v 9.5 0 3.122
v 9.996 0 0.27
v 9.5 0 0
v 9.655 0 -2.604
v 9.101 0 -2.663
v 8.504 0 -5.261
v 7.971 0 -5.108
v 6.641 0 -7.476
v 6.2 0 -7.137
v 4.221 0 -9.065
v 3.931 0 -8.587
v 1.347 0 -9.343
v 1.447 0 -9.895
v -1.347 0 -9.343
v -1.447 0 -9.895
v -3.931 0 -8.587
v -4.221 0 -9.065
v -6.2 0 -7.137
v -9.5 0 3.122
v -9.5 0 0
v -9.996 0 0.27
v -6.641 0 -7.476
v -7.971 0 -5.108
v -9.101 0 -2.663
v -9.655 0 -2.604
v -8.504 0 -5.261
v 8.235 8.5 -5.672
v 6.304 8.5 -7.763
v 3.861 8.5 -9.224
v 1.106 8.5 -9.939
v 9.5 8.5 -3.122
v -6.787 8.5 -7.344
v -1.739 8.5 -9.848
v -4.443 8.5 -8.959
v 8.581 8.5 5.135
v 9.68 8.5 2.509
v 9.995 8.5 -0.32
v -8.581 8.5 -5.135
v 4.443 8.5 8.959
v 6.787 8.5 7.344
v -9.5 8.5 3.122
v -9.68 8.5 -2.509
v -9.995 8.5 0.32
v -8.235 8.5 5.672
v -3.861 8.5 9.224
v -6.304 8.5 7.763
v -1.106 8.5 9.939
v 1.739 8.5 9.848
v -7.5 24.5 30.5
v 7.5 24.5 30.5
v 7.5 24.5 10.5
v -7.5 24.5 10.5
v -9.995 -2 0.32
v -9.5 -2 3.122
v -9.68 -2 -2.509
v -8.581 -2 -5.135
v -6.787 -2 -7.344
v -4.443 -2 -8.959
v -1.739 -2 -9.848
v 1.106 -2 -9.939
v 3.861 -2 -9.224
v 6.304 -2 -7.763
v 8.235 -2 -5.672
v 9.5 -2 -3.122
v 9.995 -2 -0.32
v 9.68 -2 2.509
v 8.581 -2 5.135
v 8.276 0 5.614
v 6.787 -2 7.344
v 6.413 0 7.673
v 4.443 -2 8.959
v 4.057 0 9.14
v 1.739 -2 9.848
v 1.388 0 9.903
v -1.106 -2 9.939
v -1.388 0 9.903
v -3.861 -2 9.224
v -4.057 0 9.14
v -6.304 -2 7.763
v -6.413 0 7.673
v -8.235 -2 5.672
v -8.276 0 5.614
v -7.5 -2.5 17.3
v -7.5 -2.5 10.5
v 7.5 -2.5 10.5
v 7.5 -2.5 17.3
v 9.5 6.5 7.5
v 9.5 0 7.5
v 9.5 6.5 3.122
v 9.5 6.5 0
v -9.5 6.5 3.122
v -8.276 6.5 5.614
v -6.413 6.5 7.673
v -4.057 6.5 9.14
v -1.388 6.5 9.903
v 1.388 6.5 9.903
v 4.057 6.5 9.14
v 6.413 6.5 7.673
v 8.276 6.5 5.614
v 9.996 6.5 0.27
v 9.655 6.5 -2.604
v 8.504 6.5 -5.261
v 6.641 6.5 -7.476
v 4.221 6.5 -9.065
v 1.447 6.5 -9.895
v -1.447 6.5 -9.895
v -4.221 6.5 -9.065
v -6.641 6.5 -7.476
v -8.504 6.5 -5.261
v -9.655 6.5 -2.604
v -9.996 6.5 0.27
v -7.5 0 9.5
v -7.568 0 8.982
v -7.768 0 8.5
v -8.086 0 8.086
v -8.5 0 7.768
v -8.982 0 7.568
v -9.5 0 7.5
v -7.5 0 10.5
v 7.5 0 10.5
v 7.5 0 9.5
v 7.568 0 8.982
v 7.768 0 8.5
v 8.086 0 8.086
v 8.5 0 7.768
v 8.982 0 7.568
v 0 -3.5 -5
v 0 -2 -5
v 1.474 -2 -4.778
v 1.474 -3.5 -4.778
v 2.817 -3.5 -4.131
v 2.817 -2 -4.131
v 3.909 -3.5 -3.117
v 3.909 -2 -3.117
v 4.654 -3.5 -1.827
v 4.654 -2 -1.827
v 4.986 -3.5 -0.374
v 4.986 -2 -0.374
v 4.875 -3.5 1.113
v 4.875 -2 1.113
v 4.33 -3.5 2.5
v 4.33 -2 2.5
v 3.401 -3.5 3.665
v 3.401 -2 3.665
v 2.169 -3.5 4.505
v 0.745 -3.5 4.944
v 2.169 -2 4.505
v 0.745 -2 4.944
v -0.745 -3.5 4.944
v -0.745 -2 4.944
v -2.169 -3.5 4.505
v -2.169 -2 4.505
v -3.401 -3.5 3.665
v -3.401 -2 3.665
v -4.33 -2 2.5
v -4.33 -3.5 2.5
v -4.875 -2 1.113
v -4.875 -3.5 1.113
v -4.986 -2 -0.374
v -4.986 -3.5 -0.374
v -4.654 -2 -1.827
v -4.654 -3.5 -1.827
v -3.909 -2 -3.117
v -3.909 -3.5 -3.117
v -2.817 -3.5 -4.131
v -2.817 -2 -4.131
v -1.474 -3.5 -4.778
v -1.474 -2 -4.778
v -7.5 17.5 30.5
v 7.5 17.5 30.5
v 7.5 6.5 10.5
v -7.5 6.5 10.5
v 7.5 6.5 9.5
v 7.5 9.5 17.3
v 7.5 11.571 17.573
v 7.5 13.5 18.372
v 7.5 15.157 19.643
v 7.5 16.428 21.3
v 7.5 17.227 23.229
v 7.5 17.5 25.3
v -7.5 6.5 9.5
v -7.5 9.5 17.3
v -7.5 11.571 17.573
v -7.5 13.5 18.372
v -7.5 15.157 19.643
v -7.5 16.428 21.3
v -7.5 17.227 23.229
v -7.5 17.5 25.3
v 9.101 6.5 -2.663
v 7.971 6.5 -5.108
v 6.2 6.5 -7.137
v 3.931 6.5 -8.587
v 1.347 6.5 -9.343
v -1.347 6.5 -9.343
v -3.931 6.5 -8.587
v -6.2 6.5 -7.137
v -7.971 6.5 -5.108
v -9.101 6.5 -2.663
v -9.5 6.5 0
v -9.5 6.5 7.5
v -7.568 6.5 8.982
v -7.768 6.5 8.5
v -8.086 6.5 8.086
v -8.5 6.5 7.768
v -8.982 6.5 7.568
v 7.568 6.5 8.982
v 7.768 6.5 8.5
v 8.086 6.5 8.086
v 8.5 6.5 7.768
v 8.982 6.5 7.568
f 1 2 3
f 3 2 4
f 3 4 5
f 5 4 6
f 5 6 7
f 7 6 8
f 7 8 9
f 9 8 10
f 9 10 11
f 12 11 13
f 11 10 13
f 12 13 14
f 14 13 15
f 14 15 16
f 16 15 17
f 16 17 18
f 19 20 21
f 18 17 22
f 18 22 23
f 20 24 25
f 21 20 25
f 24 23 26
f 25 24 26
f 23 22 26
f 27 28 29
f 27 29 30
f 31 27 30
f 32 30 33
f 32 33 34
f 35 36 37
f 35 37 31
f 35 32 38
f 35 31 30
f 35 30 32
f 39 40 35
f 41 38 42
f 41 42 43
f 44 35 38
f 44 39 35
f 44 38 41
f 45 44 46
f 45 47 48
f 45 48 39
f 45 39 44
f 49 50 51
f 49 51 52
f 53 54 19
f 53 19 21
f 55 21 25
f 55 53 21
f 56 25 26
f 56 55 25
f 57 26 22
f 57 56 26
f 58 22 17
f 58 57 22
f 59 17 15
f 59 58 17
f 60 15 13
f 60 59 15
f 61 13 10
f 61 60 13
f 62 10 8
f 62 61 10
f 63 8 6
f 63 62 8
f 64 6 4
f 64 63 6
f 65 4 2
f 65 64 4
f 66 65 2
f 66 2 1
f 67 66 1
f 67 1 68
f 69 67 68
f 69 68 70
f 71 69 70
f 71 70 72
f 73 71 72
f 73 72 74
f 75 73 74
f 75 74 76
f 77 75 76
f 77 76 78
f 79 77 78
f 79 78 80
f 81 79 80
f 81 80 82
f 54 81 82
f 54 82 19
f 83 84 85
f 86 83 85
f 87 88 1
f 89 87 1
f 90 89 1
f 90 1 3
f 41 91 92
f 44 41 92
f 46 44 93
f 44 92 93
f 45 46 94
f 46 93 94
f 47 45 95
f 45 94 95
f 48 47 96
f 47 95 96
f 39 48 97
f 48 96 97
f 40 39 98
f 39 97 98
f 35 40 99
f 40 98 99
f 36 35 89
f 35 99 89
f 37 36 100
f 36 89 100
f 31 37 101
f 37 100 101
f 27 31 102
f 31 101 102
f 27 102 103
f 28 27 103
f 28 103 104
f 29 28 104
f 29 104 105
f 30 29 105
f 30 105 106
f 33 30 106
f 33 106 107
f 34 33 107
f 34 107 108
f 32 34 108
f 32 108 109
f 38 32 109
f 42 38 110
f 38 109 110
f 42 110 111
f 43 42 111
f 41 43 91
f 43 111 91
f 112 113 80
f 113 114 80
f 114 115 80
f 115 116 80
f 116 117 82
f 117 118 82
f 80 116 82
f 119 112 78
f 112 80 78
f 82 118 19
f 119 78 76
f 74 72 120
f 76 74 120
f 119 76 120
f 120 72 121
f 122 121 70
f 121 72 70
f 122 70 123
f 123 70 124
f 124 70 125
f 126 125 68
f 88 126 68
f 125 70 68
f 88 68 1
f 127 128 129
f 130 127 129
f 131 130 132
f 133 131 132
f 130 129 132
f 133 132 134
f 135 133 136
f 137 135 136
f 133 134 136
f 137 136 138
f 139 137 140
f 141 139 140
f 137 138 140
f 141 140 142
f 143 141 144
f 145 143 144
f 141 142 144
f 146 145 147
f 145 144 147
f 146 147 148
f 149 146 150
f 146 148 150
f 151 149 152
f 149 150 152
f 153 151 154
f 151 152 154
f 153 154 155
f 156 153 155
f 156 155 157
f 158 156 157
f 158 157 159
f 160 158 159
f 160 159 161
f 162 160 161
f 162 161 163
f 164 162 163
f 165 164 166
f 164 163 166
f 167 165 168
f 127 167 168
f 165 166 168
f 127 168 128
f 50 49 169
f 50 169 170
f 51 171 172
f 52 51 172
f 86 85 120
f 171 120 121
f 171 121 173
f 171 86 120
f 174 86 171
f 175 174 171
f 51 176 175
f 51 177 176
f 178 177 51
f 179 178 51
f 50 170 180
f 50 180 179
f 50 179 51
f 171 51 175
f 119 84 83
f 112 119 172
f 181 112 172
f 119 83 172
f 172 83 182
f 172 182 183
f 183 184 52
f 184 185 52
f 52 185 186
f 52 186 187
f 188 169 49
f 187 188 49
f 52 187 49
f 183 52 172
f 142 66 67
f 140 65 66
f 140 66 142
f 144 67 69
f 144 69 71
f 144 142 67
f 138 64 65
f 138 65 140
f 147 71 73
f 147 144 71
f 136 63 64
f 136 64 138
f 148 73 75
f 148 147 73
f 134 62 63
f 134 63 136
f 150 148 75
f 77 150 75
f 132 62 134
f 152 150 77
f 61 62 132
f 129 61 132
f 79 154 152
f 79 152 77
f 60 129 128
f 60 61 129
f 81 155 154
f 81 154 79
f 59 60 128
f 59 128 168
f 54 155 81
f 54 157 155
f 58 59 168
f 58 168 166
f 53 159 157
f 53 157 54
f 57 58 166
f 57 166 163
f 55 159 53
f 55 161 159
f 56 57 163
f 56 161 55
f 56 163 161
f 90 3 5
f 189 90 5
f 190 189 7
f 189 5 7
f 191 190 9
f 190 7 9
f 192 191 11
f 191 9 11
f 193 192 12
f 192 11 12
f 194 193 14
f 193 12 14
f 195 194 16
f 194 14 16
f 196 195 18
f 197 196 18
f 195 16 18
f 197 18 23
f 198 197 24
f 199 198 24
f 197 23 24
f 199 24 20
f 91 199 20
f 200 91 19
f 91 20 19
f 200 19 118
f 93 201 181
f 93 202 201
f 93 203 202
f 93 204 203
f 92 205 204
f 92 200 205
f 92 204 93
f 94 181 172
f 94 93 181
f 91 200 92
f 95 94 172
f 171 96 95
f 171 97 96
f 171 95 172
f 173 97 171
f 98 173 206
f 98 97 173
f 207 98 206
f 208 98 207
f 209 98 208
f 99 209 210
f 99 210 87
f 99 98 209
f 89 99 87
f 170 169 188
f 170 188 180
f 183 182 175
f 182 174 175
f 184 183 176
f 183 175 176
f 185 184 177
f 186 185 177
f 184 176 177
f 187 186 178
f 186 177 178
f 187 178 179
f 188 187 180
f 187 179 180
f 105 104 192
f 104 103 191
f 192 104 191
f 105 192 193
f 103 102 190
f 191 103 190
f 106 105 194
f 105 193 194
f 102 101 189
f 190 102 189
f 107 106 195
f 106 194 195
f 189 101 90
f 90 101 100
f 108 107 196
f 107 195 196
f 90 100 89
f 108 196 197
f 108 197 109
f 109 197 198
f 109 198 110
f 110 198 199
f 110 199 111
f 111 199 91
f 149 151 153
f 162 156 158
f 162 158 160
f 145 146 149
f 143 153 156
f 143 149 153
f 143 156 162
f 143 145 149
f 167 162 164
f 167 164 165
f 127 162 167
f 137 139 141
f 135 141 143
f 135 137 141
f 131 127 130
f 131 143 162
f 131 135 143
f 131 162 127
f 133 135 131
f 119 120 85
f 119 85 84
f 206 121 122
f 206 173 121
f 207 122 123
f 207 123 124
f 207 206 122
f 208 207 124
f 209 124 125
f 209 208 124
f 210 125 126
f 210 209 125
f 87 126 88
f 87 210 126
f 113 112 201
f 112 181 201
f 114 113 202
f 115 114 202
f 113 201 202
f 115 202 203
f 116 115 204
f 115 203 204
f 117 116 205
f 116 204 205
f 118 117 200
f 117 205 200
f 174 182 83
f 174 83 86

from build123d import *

# Parameters (mm, degrees)
EXTRUDE_2_DEPTH     = 6.5
SKETCH_3_R          = 10
EXTRUDE_3_DEPTH     = 2
EXTRUDE_START       = 2
SKETCH_4_R          = 10
EXTRUDE_4_DEPTH     = 2
SKETCH_5_R          = 5
EXTRUDE_5_DEPTH     = 1.5
SKETCH_8_W          = 6
SKETCH_8_H          = 6.5
CUT_EXTRUDE_2_DEPTH = 0.94
SKETCH_9_W          = 6
SKETCH_9_H          = 6.5
CUT_EXTRUDE_3_DEPTH = 0.94
FILLET_4_R          = 2
SKETCH_10_W         = 15
SKETCH_10_H         = 2.5
EXTRUDE_6_DEPTH     = 6.8
SKETCH_11_W         = 15
SKETCH_11_H         = 18
SKETCH_11_H_2       = 6.5
EXTRUDE_7_DEPTH     = 6.8
SKETCH_12_W         = 15
SKETCH_12_H         = 7
EXTRUDE_8_DEPTH     = 13.2
SKETCH_16_W         = 15
SKETCH_16_H         = 18
SKETCH_16_H_2       = 2.5
EXTRUDE_10_DEPTH    = 3
SKETCH_17_W         = 15
SKETCH_17_H         = 20
CUT_EXTRUDE_6_DEPTH = 3
SKETCH_18_W         = 15
SKETCH_18_H         = 7
CUT_EXTRUDE_7_DEPTH = 3
FILLET_7_R          = 8


with BuildPart() as part:
    # ｽｹｯﾁ1 → ﾎﾞｽ - 押し出し2 (new body)
    with BuildSketch(Plane(origin=(0, 0, 0), x_dir=(1, 0, 0), z_dir=(0, 1, 0))):
        with BuildLine():
            Line((-9.5, 0), (-9.5, -7.5))
            Line((-9.5, -7.5), (-8.44, -7.5))
            Line((-8.44, -7.5), (-8.44, -13.5))
            Line((-8.44, -13.5), (8.44, -13.5))
            Line((8.44, -13.5), (8.44, -7.5))
            Line((8.44, -7.5), (9.5, -7.5))
            Line((9.5, -7.5), (9.5, 0))
            ThreePointArc((9.5, 0), (0, 9.438928409), (-9.5, 0))
        make_face()
    extrude(amount=EXTRUDE_2_DEPTH)

    # ｽｹｯﾁ3 → ﾎﾞｽ - 押し出し3 (add)
    with BuildSketch(Plane(origin=(0, 6.5, 0), x_dir=(1, 0, 0), z_dir=(0, 1, 0))):
        with Locations(Location((0, 0, 0), (0, 0, 198.194872339))):
            Circle(SKETCH_3_R)
    extrude(amount=EXTRUDE_3_DEPTH)

    # ｽｹｯﾁ4 → ﾎﾞｽ - 押し出し4 (add)
    with BuildSketch(Plane.XZ.offset(EXTRUDE_START)):
        with Locations(Location((0, 0, 0), (0, 0, 161.805127661))):
            Circle(SKETCH_4_R)
    extrude(amount=-EXTRUDE_4_DEPTH)

    # ｽｹｯﾁ5 → ﾎﾞｽ - 押し出し5 (add)
    with BuildSketch(Plane.XZ.offset(2)):
        with Locations(Location((0, 0, 0), (0, 0, 270))):
            Circle(SKETCH_5_R)
    extrude(amount=EXTRUDE_5_DEPTH)

    # ｽｹｯﾁ8 → ｶｯﾄ - 押し出し2 (cut)
    with BuildSketch(Plane(origin=(8.44, 0, 0), x_dir=(0, 0, -1), z_dir=(1, 0, 0))):
        with Locations((-10.5, 3.25)):
            Rectangle(SKETCH_8_W, SKETCH_8_H)
    extrude(amount=-CUT_EXTRUDE_2_DEPTH, mode=Mode.SUBTRACT)

    # ｽｹｯﾁ9 → ｶｯﾄ - 押し出し3 (cut)
    with BuildSketch(Plane.ZY.offset(8.44)):
        with Locations((10.5, 3.25)):
            Rectangle(SKETCH_9_W, SKETCH_9_H)
    extrude(amount=-CUT_EXTRUDE_3_DEPTH, mode=Mode.SUBTRACT)

    # ﾌｨﾚｯﾄ4
    fillet_4_edges = [part.edges().sort_by_distance(p)[0] for p in [
        (7.5, 3.25, 7.5),
        (-7.5, 3.25, 7.5),
    ]]
    fillet(fillet_4_edges, radius=FILLET_4_R - 0.0001)  # a hair under: the kernel refuses the full size



with BuildPart() as body_2:
    # ｽｹｯﾁ10 → ﾎﾞｽ - 押し出し6 (new body)
    with BuildSketch(Plane.XY.offset(13.5)):
        with Locations((0, -1.25)):
            Rectangle(SKETCH_10_W, SKETCH_10_H)
    extrude(amount=EXTRUDE_6_DEPTH)


with BuildPart() as part_1:
    add(part.part)

    add(body_2.part)  # ﾎﾞｽ - 押し出し7 merges body 2
    # ｽｹｯﾁ11 → ﾎﾞｽ - 押し出し7 (add)
    with BuildSketch(Plane.XY.offset(13.5)):
        with Locations((0, 15.5)):
            Rectangle(SKETCH_11_W, SKETCH_11_H)
        with Locations((0, 3.25)):
            Rectangle(SKETCH_11_W, SKETCH_11_H_2)
    extrude(amount=EXTRUDE_7_DEPTH)

    # ｽｹｯﾁ12 → ﾎﾞｽ - 押し出し8 (add)
    with BuildSketch(Plane.XY.offset(20.3)):
        with Locations((0, 21)):
            Rectangle(SKETCH_12_W, SKETCH_12_H)
    extrude(amount=EXTRUDE_8_DEPTH)

    # ｽｹｯﾁ16 → ﾎﾞｽ - 押し出し10 (add)
    with BuildSketch(Plane(origin=(0, 0, 13.5), x_dir=(-1, 0, 0), z_dir=(0, 0, -1))):
        with Locations((0, 15.5)):
            Rectangle(SKETCH_16_W, SKETCH_16_H)
        with Locations((0, -1.25)):
            Rectangle(SKETCH_16_W, SKETCH_16_H_2)
    extrude(amount=EXTRUDE_10_DEPTH)

    # ｽｹｯﾁ17 → ｶｯﾄ - 押し出し6 (cut)
    with BuildSketch(Plane.XY.offset(20.3)):
        with Locations((0, 7.5)):
            Rectangle(SKETCH_17_W, SKETCH_17_H)
    extrude(amount=-CUT_EXTRUDE_6_DEPTH, mode=Mode.SUBTRACT)

    # ｽｹｯﾁ18 → ｶｯﾄ - 押し出し7 (cut)
    with BuildSketch(Plane.XY.offset(33.5)):
        with Locations((0, 21)):
            Rectangle(SKETCH_18_W, SKETCH_18_H)
    extrude(amount=-CUT_EXTRUDE_7_DEPTH, mode=Mode.SUBTRACT)

    # ﾌｨﾚｯﾄ7
    fillet_7_edges = [part_1.edges().sort_by_distance(p)[0] for p in [
        (0, 17.5, 17.3),
    ]]
    fillet(fillet_7_edges, radius=FILLET_7_R)


solid = part_1.part
